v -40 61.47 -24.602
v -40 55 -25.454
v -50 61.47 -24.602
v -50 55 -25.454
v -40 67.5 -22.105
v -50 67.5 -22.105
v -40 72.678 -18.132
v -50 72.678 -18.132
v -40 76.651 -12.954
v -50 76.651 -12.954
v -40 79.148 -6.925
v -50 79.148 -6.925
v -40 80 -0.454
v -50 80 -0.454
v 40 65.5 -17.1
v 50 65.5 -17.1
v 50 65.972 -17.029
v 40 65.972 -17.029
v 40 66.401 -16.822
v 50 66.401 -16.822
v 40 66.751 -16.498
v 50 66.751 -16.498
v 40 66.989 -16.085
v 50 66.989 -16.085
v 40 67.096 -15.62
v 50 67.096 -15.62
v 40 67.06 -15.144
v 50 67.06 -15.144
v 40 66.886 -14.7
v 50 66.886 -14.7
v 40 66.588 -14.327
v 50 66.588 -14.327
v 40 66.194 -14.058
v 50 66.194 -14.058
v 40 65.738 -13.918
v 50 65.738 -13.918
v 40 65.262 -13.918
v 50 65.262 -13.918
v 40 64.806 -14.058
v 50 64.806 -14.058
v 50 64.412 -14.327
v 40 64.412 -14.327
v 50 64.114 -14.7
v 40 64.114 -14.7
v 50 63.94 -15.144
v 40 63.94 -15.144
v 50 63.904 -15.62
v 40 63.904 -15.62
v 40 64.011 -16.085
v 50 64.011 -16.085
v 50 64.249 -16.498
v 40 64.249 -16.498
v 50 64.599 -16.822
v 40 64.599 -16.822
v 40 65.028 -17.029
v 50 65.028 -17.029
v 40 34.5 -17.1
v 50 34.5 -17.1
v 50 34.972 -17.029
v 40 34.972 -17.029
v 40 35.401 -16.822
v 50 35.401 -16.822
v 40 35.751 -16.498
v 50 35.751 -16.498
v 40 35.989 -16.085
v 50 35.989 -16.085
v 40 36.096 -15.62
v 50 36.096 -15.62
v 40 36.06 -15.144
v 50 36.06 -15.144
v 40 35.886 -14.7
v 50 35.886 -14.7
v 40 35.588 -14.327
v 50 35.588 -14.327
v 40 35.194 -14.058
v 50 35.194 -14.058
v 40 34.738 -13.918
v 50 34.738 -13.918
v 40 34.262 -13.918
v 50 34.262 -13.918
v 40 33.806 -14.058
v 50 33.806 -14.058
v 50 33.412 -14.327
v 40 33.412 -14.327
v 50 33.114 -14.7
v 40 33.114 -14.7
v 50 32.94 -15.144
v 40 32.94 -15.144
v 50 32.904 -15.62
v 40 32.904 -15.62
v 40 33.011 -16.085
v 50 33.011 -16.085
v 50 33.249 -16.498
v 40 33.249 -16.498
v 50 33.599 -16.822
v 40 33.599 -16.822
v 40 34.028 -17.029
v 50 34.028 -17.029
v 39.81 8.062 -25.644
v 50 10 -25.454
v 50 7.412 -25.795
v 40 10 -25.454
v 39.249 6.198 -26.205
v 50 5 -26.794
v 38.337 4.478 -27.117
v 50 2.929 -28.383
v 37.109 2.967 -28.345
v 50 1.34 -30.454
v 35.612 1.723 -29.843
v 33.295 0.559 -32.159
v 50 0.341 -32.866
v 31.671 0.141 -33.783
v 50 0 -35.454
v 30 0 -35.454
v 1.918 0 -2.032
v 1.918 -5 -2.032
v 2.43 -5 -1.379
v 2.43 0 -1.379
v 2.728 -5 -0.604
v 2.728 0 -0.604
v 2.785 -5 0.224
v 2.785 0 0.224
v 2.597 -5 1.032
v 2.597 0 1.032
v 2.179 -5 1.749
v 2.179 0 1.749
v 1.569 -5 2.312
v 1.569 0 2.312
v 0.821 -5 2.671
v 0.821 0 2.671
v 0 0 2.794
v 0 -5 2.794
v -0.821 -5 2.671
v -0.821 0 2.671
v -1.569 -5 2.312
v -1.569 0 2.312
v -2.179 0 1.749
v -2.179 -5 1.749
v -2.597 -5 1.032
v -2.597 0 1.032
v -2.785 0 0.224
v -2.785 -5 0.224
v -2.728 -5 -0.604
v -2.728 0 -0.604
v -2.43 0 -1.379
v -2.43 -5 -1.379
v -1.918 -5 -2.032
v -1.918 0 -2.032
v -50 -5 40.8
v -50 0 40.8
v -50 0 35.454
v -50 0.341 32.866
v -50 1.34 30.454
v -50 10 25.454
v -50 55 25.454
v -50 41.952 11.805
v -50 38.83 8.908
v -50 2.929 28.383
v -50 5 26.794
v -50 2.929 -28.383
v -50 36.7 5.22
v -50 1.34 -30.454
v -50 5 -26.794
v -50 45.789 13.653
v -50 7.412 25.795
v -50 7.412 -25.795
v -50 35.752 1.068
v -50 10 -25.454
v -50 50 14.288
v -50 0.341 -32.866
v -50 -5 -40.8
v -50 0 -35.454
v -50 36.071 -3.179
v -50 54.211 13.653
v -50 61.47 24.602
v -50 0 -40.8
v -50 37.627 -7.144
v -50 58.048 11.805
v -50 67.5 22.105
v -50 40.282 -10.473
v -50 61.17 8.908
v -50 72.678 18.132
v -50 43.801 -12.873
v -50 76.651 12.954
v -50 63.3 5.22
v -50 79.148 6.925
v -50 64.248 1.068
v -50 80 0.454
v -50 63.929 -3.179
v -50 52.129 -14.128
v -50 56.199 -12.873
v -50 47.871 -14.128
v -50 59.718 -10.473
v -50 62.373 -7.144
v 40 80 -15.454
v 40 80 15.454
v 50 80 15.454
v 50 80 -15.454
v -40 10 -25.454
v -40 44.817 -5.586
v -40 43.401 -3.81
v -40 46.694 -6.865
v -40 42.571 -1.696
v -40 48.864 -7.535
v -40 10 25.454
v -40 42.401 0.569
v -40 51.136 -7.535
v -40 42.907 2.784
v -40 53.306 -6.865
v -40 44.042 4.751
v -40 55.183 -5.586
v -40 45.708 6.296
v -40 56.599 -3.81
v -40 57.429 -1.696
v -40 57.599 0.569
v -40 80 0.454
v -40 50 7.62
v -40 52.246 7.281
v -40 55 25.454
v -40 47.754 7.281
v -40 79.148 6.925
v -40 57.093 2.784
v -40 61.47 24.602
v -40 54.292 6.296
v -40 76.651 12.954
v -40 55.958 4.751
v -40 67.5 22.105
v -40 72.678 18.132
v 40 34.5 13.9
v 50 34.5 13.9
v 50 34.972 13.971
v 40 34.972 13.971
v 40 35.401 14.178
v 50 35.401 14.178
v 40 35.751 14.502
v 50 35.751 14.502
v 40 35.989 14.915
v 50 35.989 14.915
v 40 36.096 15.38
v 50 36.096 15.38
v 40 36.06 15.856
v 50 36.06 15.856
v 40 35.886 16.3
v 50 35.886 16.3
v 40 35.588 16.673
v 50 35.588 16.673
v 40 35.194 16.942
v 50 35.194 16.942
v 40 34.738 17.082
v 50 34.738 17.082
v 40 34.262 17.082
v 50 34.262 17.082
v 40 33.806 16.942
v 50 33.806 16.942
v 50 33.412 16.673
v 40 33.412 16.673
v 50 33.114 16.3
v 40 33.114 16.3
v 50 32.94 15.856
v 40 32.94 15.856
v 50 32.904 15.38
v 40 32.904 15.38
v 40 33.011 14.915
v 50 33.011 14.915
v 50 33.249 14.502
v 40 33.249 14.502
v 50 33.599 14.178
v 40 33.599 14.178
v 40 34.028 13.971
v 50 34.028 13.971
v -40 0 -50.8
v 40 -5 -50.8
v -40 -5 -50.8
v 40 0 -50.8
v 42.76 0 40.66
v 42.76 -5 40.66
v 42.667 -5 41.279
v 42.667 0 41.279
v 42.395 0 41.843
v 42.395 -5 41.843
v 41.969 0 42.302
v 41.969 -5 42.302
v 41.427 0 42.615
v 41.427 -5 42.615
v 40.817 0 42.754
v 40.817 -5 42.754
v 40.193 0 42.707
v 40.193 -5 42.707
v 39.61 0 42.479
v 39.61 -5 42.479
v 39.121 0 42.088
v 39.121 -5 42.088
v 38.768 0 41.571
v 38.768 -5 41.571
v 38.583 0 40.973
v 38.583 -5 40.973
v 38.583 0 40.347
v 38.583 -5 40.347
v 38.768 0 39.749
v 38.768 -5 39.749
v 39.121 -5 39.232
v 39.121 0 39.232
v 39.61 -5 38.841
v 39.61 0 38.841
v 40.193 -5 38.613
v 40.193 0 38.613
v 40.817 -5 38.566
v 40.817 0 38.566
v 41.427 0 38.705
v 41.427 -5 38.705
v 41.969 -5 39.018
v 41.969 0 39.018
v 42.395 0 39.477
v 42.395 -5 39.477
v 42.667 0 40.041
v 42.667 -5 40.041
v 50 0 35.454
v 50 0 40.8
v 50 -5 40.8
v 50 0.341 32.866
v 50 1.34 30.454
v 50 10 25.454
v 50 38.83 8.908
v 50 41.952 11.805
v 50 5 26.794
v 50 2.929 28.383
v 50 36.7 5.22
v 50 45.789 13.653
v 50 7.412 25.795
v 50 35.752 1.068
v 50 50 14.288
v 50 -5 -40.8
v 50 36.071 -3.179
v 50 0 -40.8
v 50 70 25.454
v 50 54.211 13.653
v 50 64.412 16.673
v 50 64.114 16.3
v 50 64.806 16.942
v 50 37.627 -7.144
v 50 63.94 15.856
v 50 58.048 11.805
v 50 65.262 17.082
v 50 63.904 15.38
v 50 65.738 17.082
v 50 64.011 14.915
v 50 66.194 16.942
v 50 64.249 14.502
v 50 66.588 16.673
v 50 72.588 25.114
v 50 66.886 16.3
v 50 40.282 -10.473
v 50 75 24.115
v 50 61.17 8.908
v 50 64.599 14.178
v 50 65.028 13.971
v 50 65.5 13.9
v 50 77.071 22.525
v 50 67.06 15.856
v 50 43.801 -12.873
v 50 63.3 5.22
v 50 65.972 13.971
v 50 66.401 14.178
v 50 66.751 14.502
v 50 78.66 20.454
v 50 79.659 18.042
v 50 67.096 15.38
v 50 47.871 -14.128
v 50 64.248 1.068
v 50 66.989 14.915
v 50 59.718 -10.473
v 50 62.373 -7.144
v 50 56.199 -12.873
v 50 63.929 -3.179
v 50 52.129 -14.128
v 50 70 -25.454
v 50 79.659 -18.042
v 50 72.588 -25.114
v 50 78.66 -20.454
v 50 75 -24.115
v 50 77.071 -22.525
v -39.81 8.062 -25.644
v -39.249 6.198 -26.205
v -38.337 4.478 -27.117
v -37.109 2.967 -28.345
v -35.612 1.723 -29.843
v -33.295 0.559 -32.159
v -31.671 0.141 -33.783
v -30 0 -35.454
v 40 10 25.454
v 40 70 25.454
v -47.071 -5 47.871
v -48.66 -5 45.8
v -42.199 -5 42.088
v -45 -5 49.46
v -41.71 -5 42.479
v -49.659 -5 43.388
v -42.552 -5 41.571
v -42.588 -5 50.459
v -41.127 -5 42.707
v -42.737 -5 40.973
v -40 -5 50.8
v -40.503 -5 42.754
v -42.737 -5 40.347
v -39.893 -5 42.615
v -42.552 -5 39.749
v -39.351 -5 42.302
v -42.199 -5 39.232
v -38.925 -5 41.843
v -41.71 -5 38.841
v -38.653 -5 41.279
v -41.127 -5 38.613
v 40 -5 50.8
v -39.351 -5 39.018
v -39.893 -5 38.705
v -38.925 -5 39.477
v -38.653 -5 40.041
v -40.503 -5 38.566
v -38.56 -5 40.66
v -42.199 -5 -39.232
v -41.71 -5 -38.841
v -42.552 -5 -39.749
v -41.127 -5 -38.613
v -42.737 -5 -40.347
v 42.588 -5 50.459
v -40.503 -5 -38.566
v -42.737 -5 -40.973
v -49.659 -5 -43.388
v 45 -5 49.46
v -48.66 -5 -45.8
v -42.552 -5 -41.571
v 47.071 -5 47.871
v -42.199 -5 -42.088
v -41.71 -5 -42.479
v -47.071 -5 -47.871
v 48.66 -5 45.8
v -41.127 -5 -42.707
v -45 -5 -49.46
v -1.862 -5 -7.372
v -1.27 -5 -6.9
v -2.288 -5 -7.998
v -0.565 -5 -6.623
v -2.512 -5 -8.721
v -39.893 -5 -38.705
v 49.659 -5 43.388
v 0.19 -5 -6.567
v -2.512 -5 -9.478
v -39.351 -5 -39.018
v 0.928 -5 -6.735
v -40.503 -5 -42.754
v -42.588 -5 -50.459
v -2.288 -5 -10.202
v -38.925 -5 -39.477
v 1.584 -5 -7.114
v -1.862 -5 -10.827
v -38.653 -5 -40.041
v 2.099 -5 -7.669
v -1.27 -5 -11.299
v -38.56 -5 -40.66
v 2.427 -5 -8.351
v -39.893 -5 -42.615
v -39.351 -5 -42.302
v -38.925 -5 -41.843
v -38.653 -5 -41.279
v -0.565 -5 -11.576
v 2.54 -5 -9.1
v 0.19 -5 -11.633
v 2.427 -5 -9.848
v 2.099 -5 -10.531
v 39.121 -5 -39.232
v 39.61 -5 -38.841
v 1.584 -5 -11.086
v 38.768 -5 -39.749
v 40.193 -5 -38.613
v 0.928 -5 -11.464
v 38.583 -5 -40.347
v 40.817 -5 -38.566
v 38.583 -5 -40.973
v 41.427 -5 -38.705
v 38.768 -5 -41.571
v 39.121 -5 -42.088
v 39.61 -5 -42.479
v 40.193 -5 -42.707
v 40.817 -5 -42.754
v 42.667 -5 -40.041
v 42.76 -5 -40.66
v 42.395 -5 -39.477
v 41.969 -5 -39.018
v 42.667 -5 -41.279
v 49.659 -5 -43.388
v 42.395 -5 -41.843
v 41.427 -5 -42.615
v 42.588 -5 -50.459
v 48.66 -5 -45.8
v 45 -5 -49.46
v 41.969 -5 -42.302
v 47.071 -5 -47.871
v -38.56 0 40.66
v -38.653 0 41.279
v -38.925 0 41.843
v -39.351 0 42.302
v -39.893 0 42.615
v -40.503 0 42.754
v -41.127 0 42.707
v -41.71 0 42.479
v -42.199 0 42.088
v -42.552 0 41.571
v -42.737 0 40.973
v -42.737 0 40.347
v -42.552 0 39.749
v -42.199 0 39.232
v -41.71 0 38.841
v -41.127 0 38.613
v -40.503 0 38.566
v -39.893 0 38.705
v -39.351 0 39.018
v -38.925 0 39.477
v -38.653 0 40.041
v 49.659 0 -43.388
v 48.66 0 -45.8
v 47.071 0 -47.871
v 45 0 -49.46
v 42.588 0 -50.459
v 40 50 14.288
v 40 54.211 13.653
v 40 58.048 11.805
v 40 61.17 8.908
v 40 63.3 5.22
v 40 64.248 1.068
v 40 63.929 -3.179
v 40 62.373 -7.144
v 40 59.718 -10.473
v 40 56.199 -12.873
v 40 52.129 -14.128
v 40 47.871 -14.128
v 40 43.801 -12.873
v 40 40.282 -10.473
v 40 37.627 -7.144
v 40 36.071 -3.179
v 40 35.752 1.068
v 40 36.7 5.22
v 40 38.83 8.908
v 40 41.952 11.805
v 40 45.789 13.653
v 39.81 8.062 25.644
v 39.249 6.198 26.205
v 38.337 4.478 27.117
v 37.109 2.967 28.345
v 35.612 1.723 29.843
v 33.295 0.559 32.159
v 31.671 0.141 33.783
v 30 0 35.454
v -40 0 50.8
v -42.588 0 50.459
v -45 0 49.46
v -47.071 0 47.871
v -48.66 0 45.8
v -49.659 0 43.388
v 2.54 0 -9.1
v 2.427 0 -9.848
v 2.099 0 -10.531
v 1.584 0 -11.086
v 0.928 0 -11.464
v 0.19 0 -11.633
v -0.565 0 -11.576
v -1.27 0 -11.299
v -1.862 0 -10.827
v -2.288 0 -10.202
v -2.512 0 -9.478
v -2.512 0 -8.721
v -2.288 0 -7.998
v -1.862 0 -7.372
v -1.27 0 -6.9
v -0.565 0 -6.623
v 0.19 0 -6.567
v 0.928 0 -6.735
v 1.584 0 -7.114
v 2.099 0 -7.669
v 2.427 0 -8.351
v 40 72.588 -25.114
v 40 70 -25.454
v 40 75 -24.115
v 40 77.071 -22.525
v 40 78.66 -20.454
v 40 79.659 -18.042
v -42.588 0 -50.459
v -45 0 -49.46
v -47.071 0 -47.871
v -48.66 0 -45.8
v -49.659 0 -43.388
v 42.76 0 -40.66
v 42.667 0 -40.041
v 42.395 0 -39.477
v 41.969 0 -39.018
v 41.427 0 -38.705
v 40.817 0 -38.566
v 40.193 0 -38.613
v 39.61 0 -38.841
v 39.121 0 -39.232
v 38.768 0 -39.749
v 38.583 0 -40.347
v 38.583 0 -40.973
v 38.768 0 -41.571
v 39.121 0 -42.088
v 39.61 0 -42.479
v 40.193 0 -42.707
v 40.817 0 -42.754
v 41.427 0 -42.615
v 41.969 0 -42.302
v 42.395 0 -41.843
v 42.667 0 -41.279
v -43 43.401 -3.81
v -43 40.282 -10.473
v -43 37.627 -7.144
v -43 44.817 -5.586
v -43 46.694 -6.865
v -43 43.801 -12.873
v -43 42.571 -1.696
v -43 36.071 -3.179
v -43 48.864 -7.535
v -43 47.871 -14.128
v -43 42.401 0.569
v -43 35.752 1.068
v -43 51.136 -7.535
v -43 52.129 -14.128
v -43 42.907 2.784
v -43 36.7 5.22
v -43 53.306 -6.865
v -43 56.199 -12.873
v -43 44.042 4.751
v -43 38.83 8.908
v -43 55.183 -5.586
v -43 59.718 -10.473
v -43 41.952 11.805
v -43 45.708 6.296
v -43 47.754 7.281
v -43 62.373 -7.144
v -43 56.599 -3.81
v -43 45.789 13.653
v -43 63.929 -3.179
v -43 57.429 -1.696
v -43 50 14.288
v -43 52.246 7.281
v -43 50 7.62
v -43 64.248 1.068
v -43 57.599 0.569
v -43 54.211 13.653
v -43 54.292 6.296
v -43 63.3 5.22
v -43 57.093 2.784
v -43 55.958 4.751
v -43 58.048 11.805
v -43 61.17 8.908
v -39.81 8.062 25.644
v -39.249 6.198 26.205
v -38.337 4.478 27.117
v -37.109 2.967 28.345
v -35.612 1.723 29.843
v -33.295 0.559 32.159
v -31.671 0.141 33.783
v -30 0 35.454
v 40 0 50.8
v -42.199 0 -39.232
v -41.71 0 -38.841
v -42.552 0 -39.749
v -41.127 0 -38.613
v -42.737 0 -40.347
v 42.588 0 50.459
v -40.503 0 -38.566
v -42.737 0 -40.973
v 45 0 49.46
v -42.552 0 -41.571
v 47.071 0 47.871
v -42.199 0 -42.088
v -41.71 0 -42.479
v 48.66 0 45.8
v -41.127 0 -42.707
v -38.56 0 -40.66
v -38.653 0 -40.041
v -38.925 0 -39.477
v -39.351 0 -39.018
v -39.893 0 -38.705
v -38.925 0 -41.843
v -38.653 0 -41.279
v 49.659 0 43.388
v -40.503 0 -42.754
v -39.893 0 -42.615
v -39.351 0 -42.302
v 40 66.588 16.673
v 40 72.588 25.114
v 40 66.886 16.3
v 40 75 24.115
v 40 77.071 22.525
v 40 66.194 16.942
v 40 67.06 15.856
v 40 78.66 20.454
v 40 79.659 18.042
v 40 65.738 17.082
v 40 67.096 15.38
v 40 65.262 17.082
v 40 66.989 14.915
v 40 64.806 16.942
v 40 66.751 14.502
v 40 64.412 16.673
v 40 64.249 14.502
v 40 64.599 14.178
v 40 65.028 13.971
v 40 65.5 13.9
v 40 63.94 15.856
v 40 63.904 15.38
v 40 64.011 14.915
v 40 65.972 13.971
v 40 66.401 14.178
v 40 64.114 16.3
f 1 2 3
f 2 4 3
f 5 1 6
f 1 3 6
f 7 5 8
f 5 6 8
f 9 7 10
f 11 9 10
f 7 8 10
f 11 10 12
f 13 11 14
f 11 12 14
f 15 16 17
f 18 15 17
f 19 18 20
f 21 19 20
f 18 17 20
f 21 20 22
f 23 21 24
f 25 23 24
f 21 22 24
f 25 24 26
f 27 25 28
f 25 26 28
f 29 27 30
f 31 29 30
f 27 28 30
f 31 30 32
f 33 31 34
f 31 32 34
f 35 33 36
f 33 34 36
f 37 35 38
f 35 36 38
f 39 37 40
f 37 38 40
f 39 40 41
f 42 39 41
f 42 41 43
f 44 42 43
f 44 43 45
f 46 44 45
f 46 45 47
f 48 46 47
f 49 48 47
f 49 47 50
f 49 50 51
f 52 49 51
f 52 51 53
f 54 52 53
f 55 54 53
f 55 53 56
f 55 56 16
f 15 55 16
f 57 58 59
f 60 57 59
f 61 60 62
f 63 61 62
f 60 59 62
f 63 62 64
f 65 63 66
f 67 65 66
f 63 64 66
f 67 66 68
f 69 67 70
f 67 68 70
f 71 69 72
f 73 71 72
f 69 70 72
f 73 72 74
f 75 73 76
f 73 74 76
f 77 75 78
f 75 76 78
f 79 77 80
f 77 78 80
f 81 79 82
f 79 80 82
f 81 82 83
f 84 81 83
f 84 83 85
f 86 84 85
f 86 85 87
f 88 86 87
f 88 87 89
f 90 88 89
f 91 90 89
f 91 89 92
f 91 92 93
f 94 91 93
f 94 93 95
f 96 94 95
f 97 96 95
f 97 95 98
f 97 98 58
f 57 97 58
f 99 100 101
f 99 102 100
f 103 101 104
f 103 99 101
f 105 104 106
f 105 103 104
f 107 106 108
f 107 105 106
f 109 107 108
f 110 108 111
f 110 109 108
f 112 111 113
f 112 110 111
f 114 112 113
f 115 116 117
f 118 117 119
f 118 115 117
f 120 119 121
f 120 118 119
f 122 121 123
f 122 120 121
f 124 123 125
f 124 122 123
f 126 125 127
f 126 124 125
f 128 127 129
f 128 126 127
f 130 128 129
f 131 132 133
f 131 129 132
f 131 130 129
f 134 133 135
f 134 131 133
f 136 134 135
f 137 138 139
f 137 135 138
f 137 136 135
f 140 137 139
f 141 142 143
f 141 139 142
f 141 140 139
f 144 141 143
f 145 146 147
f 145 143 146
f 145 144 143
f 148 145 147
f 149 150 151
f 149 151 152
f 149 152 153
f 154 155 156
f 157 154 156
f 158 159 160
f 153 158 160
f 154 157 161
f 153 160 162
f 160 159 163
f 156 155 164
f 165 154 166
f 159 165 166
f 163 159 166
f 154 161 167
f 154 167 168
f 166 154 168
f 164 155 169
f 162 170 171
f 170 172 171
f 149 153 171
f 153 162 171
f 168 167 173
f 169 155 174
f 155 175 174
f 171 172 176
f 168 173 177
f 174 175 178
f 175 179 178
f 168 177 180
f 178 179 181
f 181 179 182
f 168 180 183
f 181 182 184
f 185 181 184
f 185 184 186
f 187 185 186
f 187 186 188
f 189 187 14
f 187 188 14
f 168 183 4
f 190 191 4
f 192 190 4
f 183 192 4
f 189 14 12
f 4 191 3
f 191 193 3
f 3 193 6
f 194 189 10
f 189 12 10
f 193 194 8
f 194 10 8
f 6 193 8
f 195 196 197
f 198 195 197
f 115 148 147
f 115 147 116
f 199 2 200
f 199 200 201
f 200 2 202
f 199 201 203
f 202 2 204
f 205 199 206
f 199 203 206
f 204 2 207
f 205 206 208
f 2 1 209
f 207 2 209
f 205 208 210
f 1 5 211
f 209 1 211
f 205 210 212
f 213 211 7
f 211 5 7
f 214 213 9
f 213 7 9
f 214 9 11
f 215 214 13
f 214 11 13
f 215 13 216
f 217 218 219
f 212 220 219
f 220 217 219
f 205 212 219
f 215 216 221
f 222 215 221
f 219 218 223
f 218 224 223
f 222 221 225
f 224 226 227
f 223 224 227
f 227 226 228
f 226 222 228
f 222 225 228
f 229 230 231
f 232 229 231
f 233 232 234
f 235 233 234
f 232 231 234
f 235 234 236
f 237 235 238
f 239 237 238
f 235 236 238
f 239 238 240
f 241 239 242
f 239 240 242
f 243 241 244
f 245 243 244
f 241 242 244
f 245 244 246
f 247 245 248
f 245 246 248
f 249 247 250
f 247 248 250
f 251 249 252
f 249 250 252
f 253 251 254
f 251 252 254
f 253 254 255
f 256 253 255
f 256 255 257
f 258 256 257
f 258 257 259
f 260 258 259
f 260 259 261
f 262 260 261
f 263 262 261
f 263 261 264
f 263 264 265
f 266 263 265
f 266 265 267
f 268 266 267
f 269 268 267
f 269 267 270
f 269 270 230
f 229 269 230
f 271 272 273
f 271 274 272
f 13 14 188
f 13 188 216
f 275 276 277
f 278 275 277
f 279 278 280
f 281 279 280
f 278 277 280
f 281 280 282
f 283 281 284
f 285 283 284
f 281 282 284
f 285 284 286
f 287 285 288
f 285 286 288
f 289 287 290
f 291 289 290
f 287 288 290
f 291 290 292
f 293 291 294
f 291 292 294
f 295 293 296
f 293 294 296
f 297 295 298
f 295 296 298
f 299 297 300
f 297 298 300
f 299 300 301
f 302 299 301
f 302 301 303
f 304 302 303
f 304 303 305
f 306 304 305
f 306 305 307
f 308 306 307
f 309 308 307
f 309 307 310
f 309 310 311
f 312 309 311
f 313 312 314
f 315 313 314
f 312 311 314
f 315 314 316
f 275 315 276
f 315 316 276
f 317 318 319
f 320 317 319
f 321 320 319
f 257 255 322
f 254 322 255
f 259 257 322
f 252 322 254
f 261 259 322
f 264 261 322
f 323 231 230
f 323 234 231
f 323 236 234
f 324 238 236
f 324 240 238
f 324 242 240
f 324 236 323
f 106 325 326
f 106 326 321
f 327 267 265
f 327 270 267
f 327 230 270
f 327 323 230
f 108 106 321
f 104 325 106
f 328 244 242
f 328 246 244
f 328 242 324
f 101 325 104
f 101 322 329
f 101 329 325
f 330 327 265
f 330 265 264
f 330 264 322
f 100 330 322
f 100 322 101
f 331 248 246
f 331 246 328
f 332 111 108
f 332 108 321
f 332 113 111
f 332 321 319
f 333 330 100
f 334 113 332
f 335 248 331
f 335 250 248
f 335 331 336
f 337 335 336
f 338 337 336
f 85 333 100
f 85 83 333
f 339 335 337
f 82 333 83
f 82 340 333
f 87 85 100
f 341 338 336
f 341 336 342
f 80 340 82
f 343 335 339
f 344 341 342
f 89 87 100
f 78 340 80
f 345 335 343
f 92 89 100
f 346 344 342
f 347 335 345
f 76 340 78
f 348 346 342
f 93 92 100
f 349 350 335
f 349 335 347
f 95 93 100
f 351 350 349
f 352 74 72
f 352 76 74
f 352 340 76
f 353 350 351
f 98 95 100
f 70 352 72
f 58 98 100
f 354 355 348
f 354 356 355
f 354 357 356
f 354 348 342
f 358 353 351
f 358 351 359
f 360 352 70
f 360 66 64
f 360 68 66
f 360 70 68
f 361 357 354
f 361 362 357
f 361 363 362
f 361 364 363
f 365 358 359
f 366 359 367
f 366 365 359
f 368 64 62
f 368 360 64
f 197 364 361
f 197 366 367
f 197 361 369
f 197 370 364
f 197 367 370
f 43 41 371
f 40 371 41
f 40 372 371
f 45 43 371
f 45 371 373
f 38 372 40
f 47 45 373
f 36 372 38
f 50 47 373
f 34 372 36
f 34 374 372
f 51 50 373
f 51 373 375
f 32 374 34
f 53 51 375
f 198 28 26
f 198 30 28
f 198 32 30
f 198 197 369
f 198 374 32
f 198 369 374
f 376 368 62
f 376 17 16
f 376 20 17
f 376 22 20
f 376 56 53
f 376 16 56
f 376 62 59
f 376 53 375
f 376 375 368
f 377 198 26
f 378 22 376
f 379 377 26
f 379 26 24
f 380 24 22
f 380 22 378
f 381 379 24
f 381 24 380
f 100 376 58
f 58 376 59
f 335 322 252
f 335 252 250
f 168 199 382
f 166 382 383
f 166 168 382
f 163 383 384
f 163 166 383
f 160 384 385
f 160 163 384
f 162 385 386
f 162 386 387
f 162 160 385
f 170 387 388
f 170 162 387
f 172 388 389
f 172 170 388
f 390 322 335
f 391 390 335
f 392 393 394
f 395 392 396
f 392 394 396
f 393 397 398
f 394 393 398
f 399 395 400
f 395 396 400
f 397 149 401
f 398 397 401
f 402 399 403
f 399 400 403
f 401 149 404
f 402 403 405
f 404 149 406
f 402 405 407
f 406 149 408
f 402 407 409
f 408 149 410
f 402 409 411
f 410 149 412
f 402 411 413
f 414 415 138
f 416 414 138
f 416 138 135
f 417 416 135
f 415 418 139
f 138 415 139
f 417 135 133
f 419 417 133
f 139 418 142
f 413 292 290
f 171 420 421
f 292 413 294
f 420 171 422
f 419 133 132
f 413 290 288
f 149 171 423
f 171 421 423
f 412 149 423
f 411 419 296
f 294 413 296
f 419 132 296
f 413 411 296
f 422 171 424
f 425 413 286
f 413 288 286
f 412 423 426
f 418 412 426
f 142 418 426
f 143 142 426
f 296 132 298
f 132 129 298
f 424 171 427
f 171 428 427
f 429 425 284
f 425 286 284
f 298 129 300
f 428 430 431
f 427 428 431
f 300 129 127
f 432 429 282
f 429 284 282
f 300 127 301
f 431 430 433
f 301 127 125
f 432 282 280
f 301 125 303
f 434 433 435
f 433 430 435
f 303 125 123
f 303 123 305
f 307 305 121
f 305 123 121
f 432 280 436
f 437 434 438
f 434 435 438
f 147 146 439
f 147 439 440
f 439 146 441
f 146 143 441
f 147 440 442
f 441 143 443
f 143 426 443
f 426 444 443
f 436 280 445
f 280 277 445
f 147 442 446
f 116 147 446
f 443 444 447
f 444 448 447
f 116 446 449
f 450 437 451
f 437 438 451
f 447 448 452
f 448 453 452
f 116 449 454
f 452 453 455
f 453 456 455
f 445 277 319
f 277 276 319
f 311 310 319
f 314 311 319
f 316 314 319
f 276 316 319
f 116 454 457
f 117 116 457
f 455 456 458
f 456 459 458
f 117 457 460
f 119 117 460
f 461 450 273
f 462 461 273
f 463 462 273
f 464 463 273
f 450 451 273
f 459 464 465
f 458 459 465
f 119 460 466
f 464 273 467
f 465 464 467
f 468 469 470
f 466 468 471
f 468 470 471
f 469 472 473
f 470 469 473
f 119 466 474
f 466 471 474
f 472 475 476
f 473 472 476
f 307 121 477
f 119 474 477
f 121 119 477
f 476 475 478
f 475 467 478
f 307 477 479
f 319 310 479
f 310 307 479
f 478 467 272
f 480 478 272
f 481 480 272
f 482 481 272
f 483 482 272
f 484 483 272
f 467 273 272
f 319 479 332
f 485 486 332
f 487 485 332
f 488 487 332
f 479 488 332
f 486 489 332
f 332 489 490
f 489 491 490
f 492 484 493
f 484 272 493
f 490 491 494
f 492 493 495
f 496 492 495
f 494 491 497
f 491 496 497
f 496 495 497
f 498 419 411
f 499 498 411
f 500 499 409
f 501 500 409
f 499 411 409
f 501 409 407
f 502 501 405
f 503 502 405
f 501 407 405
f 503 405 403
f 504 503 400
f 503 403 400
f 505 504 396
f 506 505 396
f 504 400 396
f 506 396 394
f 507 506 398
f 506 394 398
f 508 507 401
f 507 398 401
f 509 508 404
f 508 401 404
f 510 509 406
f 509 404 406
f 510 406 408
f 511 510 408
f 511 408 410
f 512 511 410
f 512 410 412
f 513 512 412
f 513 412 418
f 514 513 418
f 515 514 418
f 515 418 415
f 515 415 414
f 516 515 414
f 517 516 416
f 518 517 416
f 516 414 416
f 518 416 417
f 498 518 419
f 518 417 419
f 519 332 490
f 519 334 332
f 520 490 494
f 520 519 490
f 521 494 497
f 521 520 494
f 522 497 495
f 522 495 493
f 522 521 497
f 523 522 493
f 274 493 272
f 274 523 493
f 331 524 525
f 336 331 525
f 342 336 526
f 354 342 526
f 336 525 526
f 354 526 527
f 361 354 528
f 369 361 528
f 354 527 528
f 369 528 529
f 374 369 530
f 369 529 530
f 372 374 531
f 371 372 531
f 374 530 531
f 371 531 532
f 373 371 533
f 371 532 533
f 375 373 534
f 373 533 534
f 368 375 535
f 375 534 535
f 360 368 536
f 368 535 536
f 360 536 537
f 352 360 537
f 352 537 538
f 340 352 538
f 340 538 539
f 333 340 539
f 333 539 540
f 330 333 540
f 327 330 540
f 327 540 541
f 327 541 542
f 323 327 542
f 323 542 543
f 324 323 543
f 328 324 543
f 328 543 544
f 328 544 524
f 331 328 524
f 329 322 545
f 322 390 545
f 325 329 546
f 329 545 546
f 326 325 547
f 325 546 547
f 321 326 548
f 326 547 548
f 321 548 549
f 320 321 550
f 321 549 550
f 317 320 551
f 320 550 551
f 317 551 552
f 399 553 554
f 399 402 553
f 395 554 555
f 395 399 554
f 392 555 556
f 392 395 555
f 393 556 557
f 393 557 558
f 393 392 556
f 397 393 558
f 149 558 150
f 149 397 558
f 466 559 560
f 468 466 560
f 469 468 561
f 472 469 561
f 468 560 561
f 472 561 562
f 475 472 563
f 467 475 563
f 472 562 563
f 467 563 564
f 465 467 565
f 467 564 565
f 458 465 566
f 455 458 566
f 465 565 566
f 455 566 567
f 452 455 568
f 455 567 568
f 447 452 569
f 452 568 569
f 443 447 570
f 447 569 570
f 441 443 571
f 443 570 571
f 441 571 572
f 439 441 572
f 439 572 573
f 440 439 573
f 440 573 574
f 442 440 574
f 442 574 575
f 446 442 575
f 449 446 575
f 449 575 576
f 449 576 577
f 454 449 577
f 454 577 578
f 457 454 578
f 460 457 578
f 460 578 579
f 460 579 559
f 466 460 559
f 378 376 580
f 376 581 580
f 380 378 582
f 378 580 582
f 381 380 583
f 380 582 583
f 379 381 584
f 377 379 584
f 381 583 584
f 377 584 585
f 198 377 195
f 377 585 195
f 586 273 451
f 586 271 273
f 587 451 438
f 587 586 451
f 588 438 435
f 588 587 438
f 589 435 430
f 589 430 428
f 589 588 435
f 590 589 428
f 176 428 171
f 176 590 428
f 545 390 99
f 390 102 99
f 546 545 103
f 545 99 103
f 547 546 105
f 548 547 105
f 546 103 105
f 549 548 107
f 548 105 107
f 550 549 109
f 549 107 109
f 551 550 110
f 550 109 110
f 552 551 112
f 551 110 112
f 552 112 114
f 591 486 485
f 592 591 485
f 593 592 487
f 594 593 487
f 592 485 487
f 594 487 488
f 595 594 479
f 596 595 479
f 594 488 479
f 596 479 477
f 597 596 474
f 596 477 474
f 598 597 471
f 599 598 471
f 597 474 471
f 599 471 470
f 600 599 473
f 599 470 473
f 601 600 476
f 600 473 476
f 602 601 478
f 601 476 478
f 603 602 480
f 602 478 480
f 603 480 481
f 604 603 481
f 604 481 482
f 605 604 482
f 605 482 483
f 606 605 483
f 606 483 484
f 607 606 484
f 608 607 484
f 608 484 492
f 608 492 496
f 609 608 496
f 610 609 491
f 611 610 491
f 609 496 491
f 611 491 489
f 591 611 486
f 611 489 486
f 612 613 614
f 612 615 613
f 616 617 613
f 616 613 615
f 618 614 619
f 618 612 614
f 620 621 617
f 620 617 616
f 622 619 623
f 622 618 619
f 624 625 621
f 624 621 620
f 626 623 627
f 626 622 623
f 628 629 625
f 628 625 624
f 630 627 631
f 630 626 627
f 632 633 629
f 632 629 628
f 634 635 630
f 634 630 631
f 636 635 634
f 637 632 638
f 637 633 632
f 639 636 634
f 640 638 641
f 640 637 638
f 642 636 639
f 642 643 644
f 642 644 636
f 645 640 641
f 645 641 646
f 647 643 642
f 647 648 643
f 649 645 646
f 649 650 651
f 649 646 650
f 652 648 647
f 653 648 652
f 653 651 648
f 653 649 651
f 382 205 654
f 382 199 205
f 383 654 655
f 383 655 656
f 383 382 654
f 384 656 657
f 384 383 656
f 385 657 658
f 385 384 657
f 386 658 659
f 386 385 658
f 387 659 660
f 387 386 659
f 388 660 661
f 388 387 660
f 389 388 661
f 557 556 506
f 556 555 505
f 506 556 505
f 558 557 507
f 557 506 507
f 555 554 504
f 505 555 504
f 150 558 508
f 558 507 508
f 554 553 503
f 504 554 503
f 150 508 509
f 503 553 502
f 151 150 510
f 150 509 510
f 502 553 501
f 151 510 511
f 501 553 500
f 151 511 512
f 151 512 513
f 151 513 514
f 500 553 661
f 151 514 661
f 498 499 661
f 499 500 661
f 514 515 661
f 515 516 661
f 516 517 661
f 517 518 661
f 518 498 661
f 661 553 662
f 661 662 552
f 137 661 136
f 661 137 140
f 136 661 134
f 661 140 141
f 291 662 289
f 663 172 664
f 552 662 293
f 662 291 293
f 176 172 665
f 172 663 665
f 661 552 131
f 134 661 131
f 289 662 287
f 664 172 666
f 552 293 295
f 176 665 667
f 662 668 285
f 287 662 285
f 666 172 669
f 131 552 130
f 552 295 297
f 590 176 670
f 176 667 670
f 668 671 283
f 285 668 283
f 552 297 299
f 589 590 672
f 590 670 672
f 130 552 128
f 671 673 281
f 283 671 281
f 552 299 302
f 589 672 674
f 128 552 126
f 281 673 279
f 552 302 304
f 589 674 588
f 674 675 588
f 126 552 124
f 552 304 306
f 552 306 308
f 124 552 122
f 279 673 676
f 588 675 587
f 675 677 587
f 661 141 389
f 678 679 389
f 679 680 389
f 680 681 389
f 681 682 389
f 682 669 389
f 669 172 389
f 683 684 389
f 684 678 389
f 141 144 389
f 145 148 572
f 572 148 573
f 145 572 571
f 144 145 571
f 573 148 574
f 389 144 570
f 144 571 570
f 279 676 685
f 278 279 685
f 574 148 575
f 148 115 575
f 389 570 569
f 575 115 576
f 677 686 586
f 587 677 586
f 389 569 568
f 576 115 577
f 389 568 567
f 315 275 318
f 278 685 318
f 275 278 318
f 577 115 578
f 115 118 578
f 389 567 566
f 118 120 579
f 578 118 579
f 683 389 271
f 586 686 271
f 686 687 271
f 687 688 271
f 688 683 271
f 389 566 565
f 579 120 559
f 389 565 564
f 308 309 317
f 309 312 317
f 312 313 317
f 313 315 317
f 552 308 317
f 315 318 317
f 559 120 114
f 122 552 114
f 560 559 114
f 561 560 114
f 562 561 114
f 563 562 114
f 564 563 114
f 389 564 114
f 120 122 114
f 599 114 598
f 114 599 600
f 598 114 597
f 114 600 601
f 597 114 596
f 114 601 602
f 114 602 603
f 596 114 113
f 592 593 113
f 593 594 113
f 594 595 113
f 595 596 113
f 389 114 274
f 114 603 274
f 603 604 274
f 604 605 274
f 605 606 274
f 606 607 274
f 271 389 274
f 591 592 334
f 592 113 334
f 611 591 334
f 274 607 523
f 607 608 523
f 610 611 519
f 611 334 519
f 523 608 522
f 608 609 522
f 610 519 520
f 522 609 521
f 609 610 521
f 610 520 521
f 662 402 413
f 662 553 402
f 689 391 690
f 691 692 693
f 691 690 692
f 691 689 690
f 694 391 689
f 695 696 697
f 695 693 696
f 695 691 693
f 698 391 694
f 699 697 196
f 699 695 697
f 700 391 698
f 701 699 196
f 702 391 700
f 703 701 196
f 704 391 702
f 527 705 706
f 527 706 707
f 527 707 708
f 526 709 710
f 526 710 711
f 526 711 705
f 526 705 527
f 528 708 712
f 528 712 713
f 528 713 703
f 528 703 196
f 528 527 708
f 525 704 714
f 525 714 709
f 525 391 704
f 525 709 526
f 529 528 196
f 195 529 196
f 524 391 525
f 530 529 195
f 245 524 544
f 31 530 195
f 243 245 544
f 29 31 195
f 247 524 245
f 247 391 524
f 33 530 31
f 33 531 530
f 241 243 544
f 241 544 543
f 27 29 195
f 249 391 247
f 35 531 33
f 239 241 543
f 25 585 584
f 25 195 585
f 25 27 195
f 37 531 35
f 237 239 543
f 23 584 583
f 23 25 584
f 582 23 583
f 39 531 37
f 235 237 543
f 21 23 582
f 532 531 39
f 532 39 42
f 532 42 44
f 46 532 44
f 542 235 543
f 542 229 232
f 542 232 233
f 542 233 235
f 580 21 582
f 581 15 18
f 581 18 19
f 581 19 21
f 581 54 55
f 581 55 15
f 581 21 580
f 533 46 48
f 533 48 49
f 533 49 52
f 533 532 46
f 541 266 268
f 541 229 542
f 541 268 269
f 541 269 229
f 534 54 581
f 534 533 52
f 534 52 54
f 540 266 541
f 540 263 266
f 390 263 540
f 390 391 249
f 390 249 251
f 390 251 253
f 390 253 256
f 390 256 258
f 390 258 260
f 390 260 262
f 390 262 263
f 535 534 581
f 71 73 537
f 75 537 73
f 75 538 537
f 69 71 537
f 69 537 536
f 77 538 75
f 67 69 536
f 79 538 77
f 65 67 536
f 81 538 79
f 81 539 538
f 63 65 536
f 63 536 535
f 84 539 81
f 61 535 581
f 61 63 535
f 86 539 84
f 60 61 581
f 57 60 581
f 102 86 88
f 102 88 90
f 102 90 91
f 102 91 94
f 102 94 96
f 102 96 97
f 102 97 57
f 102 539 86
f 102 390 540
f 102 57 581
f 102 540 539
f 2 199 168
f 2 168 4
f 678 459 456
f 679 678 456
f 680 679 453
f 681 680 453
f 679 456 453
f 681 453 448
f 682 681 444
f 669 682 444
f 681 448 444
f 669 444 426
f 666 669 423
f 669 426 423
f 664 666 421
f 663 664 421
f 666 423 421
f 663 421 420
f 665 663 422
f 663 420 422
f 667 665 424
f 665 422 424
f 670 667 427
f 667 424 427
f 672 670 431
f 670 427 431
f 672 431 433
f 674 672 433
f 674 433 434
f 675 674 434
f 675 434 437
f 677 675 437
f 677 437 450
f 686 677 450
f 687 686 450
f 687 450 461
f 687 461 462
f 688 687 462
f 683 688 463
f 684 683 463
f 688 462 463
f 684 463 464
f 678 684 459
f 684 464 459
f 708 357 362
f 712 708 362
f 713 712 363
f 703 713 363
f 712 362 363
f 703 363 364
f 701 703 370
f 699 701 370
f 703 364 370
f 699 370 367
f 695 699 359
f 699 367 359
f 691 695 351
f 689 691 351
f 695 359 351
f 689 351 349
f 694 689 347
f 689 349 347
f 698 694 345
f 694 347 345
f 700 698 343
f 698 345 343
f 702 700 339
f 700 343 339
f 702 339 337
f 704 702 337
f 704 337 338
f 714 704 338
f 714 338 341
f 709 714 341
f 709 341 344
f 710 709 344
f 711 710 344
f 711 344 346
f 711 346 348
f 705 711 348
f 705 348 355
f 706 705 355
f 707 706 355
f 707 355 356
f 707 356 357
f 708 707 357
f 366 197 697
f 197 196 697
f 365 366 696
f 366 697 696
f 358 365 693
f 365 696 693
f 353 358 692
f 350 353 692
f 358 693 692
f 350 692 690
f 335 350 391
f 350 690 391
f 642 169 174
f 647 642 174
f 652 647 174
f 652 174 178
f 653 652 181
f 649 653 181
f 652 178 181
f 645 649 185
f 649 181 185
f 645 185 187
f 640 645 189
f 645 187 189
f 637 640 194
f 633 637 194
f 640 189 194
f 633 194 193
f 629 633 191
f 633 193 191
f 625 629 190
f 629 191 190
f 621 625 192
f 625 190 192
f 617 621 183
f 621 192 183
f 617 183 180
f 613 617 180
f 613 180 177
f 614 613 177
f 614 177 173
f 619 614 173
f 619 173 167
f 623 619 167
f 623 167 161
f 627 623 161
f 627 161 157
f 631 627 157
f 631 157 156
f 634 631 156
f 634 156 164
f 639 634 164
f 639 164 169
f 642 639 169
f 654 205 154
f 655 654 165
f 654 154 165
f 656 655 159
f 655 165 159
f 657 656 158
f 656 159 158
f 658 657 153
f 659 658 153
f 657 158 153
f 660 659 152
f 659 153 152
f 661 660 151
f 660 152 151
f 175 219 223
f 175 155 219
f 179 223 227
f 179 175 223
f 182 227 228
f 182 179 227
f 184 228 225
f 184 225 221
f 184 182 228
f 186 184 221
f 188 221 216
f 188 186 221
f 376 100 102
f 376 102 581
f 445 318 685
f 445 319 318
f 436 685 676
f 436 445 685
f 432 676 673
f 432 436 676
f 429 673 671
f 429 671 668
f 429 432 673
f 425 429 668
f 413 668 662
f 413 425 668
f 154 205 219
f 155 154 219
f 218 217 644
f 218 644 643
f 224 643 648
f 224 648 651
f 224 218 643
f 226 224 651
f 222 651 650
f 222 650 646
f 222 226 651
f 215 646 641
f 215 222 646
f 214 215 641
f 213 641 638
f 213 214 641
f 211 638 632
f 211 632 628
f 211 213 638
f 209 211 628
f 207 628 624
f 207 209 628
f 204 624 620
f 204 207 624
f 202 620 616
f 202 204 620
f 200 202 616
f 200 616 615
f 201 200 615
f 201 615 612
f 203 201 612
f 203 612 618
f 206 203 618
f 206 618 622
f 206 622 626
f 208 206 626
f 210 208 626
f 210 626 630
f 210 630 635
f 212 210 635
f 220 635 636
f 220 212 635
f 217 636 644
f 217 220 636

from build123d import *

# Parameters (mm, degrees)
SKETCH2_W             = 10
SKETCH2_H             = 101.6
BOSS_EXTRUDE1_DEPTH   = 80
BOSS_EXTRUDE1_2_DEPTH = 80
SKETCH2_3_W           = 10
SKETCH2_3_H           = 101.6
SKETCH2_3_W_2         = 80
BOSS_EXTRUDE2_DEPTH   = 5
SKETCH3_R             = 14.2875
CUT_EXTRUDE1_DEPTH    = 117
SKETCH4_W             = 25.345740838
SKETCH4_H             = 80
CUT_EXTRUDE2_DEPTH    = 119
FILLET3_R             = 10
FILLET2_R             = 10
SKETCH7_R             = 1.6
CUT_EXTRUDE4_DEPTH    = 21
BOSS_EXTRUDE3_START   = 80
SKETCH8_R             = 14.2875
SKETCH8_R_2           = 7.62
BOSS_EXTRUDE3_DEPTH   = 3
SKETCH9_R             = 2.1
CUT_EXTRUDE5_DEPTH    = 5
CUT_EXTRUDE6_DEPTH    = 10
SKETCH10_R            = 2.54
CUT_EXTRUDE7_DEPTH    = 10
FILLET4_R             = 25


with BuildPart() as part:
    # Sketch2 → Boss-Extrude1 (new body)
    with BuildSketch(Plane(origin=(0, 0, 0), x_dir=(1, 0, 0), z_dir=(0, 1, 0))):
        with Locations((-45, 0)):
            Rectangle(SKETCH2_W, SKETCH2_H)
    extrude(amount=BOSS_EXTRUDE1_DEPTH)



with BuildPart() as body_2:
    # Sketch2 → Boss-Extrude1 2 (new body)
    with BuildSketch(Plane(origin=(0, 0, 0), x_dir=(1, 0, 0), z_dir=(0, 1, 0))):
        with Locations((45, 0)):
            Rectangle(SKETCH2_W, SKETCH2_H)
    extrude(amount=BOSS_EXTRUDE1_2_DEPTH)


with BuildPart() as part_1:
    add(part.part)

    add(body_2.part)  # Boss-Extrude2 merges body 2
    # Sketch2<3> → Boss-Extrude2 (add)
    with BuildSketch(Plane(origin=(0, 0, 0), x_dir=(1, 0, 0), z_dir=(0, 1, 0))):
        with Locations((45, 0)):
            Rectangle(SKETCH2_3_W, SKETCH2_3_H)
        Rectangle(SKETCH2_3_W_2, SKETCH2_3_H)
        with Locations((-45, 0)):
            Rectangle(SKETCH2_3_W, SKETCH2_3_H)
    extrude(amount=-BOSS_EXTRUDE2_DEPTH)

    # Sketch3 → Cut-Extrude1 (cut)
    with BuildSketch(Plane.ZY.offset(50)):
        with Locations((0, 50)):
            Circle(SKETCH3_R)
    extrude(amount=-CUT_EXTRUDE1_DEPTH, mode=Mode.SUBTRACT)

    # Sketch4 → Cut-Extrude2 (cut)
    with BuildSketch(Plane(origin=(50, 0, 0), x_dir=(0, 0, -1), z_dir=(1, 0, 0))):
        with Locations((-38.127129581, 40)):
            Rectangle(SKETCH4_W, SKETCH4_H)
        with Locations((38.127129581, 40)):
            Rectangle(SKETCH4_W, SKETCH4_H)
    extrude(amount=-CUT_EXTRUDE2_DEPTH, mode=Mode.SUBTRACT)

    # Fillet3
    fillet3_edges = [part_1.edges().sort_by_distance(p)[0] for p in [
        (45, 80, -25.454259162),
        (45, 80, 25.454259162),
        (40, 0, 0),
        (-40, 0, 0),
        (-45, 0, 25.454259162),
        (45, 0, 25.454259162),
        (-45, 0, -25.454259162),
        (45, 0, -25.454259162),
    ]]
    fillet(fillet3_edges, radius=FILLET3_R)

    # Fillet2
    fillet2_edges = [part_1.edges().sort_by_distance(p)[0] for p in [
        (50, -2.5, -50.8),
        (50, -2.5, 50.8),
        (-50, -2.5, 50.8),
        (-50, -2.5, -50.8),
    ]]
    fillet(fillet2_edges, radius=FILLET2_R)

    # Sketch7 → Cut-Extrude4 (cut)
    with BuildSketch(Plane(origin=(50, 0, 0), x_dir=(0, 0, -1), z_dir=(1, 0, 0))):
        with Locations((-15.5, 65.5)):
            Circle(SKETCH7_R)
        with Locations((15.5, 65.5)):
            Circle(SKETCH7_R)
        with Locations((15.5, 34.5)):
            Circle(SKETCH7_R)
        with Locations((-15.5, 34.5)):
            Circle(SKETCH7_R)
    extrude(amount=-CUT_EXTRUDE4_DEPTH, mode=Mode.SUBTRACT)

    # Sketch8 → Boss-Extrude3 (add)
    with BuildSketch(Plane.ZY.offset(-40).offset(BOSS_EXTRUDE3_START)):
        with Locations((0, 50)):
            Circle(SKETCH8_R)
        with Locations((0, 50)):
            Circle(SKETCH8_R_2, mode=Mode.SUBTRACT)
    extrude(amount=BOSS_EXTRUDE3_DEPTH)

    # Sketch9 → Cut-Extrude5 (cut)
    with BuildSketch(Plane.XZ.offset(5)):
        with Locations((-40.66, 40.66)):
            Circle(SKETCH9_R)
        with Locations((40.66, 40.66)):
            Circle(SKETCH9_R)
        with Locations((-40.66, -40.66)):
            Circle(SKETCH9_R)
        with Locations((40.66, -40.66)):
            Circle(SKETCH9_R)
    extrude(amount=-CUT_EXTRUDE5_DEPTH, mode=Mode.SUBTRACT)

    # Sketch5 → Cut-Extrude6 (cut)
    with BuildSketch(Plane(origin=(0, 0, 0), x_dir=(1, 0, 0), z_dir=(0, 1, 0))):
        with BuildLine():
            Line((-1.917657947, 2.032), (1.917657947, 2.032))
            ThreePointArc((1.917657947, 2.032), (0, -2.794), (-1.917657947, 2.032))
        make_face()
    extrude(amount=-CUT_EXTRUDE6_DEPTH, mode=Mode.SUBTRACT)

    # Sketch10 → Cut-Extrude7 (cut)
    with BuildSketch(Plane(origin=(0, 0, 0), x_dir=(1, 0, 0), z_dir=(0, 1, 0))):
        with Locations((0, 9.099794366)):
            Circle(SKETCH10_R)
    extrude(amount=-CUT_EXTRUDE7_DEPTH, mode=Mode.SUBTRACT)

    # Fillet4
    fillet4_edges = [part_1.edges().sort_by_distance(p)[0] for p in [
        (-45, 80, 25.454259162),
        (-45, 80, -25.454259162),
    ]]
    fillet(fillet4_edges, radius=FILLET4_R)


solid = part_1.part
